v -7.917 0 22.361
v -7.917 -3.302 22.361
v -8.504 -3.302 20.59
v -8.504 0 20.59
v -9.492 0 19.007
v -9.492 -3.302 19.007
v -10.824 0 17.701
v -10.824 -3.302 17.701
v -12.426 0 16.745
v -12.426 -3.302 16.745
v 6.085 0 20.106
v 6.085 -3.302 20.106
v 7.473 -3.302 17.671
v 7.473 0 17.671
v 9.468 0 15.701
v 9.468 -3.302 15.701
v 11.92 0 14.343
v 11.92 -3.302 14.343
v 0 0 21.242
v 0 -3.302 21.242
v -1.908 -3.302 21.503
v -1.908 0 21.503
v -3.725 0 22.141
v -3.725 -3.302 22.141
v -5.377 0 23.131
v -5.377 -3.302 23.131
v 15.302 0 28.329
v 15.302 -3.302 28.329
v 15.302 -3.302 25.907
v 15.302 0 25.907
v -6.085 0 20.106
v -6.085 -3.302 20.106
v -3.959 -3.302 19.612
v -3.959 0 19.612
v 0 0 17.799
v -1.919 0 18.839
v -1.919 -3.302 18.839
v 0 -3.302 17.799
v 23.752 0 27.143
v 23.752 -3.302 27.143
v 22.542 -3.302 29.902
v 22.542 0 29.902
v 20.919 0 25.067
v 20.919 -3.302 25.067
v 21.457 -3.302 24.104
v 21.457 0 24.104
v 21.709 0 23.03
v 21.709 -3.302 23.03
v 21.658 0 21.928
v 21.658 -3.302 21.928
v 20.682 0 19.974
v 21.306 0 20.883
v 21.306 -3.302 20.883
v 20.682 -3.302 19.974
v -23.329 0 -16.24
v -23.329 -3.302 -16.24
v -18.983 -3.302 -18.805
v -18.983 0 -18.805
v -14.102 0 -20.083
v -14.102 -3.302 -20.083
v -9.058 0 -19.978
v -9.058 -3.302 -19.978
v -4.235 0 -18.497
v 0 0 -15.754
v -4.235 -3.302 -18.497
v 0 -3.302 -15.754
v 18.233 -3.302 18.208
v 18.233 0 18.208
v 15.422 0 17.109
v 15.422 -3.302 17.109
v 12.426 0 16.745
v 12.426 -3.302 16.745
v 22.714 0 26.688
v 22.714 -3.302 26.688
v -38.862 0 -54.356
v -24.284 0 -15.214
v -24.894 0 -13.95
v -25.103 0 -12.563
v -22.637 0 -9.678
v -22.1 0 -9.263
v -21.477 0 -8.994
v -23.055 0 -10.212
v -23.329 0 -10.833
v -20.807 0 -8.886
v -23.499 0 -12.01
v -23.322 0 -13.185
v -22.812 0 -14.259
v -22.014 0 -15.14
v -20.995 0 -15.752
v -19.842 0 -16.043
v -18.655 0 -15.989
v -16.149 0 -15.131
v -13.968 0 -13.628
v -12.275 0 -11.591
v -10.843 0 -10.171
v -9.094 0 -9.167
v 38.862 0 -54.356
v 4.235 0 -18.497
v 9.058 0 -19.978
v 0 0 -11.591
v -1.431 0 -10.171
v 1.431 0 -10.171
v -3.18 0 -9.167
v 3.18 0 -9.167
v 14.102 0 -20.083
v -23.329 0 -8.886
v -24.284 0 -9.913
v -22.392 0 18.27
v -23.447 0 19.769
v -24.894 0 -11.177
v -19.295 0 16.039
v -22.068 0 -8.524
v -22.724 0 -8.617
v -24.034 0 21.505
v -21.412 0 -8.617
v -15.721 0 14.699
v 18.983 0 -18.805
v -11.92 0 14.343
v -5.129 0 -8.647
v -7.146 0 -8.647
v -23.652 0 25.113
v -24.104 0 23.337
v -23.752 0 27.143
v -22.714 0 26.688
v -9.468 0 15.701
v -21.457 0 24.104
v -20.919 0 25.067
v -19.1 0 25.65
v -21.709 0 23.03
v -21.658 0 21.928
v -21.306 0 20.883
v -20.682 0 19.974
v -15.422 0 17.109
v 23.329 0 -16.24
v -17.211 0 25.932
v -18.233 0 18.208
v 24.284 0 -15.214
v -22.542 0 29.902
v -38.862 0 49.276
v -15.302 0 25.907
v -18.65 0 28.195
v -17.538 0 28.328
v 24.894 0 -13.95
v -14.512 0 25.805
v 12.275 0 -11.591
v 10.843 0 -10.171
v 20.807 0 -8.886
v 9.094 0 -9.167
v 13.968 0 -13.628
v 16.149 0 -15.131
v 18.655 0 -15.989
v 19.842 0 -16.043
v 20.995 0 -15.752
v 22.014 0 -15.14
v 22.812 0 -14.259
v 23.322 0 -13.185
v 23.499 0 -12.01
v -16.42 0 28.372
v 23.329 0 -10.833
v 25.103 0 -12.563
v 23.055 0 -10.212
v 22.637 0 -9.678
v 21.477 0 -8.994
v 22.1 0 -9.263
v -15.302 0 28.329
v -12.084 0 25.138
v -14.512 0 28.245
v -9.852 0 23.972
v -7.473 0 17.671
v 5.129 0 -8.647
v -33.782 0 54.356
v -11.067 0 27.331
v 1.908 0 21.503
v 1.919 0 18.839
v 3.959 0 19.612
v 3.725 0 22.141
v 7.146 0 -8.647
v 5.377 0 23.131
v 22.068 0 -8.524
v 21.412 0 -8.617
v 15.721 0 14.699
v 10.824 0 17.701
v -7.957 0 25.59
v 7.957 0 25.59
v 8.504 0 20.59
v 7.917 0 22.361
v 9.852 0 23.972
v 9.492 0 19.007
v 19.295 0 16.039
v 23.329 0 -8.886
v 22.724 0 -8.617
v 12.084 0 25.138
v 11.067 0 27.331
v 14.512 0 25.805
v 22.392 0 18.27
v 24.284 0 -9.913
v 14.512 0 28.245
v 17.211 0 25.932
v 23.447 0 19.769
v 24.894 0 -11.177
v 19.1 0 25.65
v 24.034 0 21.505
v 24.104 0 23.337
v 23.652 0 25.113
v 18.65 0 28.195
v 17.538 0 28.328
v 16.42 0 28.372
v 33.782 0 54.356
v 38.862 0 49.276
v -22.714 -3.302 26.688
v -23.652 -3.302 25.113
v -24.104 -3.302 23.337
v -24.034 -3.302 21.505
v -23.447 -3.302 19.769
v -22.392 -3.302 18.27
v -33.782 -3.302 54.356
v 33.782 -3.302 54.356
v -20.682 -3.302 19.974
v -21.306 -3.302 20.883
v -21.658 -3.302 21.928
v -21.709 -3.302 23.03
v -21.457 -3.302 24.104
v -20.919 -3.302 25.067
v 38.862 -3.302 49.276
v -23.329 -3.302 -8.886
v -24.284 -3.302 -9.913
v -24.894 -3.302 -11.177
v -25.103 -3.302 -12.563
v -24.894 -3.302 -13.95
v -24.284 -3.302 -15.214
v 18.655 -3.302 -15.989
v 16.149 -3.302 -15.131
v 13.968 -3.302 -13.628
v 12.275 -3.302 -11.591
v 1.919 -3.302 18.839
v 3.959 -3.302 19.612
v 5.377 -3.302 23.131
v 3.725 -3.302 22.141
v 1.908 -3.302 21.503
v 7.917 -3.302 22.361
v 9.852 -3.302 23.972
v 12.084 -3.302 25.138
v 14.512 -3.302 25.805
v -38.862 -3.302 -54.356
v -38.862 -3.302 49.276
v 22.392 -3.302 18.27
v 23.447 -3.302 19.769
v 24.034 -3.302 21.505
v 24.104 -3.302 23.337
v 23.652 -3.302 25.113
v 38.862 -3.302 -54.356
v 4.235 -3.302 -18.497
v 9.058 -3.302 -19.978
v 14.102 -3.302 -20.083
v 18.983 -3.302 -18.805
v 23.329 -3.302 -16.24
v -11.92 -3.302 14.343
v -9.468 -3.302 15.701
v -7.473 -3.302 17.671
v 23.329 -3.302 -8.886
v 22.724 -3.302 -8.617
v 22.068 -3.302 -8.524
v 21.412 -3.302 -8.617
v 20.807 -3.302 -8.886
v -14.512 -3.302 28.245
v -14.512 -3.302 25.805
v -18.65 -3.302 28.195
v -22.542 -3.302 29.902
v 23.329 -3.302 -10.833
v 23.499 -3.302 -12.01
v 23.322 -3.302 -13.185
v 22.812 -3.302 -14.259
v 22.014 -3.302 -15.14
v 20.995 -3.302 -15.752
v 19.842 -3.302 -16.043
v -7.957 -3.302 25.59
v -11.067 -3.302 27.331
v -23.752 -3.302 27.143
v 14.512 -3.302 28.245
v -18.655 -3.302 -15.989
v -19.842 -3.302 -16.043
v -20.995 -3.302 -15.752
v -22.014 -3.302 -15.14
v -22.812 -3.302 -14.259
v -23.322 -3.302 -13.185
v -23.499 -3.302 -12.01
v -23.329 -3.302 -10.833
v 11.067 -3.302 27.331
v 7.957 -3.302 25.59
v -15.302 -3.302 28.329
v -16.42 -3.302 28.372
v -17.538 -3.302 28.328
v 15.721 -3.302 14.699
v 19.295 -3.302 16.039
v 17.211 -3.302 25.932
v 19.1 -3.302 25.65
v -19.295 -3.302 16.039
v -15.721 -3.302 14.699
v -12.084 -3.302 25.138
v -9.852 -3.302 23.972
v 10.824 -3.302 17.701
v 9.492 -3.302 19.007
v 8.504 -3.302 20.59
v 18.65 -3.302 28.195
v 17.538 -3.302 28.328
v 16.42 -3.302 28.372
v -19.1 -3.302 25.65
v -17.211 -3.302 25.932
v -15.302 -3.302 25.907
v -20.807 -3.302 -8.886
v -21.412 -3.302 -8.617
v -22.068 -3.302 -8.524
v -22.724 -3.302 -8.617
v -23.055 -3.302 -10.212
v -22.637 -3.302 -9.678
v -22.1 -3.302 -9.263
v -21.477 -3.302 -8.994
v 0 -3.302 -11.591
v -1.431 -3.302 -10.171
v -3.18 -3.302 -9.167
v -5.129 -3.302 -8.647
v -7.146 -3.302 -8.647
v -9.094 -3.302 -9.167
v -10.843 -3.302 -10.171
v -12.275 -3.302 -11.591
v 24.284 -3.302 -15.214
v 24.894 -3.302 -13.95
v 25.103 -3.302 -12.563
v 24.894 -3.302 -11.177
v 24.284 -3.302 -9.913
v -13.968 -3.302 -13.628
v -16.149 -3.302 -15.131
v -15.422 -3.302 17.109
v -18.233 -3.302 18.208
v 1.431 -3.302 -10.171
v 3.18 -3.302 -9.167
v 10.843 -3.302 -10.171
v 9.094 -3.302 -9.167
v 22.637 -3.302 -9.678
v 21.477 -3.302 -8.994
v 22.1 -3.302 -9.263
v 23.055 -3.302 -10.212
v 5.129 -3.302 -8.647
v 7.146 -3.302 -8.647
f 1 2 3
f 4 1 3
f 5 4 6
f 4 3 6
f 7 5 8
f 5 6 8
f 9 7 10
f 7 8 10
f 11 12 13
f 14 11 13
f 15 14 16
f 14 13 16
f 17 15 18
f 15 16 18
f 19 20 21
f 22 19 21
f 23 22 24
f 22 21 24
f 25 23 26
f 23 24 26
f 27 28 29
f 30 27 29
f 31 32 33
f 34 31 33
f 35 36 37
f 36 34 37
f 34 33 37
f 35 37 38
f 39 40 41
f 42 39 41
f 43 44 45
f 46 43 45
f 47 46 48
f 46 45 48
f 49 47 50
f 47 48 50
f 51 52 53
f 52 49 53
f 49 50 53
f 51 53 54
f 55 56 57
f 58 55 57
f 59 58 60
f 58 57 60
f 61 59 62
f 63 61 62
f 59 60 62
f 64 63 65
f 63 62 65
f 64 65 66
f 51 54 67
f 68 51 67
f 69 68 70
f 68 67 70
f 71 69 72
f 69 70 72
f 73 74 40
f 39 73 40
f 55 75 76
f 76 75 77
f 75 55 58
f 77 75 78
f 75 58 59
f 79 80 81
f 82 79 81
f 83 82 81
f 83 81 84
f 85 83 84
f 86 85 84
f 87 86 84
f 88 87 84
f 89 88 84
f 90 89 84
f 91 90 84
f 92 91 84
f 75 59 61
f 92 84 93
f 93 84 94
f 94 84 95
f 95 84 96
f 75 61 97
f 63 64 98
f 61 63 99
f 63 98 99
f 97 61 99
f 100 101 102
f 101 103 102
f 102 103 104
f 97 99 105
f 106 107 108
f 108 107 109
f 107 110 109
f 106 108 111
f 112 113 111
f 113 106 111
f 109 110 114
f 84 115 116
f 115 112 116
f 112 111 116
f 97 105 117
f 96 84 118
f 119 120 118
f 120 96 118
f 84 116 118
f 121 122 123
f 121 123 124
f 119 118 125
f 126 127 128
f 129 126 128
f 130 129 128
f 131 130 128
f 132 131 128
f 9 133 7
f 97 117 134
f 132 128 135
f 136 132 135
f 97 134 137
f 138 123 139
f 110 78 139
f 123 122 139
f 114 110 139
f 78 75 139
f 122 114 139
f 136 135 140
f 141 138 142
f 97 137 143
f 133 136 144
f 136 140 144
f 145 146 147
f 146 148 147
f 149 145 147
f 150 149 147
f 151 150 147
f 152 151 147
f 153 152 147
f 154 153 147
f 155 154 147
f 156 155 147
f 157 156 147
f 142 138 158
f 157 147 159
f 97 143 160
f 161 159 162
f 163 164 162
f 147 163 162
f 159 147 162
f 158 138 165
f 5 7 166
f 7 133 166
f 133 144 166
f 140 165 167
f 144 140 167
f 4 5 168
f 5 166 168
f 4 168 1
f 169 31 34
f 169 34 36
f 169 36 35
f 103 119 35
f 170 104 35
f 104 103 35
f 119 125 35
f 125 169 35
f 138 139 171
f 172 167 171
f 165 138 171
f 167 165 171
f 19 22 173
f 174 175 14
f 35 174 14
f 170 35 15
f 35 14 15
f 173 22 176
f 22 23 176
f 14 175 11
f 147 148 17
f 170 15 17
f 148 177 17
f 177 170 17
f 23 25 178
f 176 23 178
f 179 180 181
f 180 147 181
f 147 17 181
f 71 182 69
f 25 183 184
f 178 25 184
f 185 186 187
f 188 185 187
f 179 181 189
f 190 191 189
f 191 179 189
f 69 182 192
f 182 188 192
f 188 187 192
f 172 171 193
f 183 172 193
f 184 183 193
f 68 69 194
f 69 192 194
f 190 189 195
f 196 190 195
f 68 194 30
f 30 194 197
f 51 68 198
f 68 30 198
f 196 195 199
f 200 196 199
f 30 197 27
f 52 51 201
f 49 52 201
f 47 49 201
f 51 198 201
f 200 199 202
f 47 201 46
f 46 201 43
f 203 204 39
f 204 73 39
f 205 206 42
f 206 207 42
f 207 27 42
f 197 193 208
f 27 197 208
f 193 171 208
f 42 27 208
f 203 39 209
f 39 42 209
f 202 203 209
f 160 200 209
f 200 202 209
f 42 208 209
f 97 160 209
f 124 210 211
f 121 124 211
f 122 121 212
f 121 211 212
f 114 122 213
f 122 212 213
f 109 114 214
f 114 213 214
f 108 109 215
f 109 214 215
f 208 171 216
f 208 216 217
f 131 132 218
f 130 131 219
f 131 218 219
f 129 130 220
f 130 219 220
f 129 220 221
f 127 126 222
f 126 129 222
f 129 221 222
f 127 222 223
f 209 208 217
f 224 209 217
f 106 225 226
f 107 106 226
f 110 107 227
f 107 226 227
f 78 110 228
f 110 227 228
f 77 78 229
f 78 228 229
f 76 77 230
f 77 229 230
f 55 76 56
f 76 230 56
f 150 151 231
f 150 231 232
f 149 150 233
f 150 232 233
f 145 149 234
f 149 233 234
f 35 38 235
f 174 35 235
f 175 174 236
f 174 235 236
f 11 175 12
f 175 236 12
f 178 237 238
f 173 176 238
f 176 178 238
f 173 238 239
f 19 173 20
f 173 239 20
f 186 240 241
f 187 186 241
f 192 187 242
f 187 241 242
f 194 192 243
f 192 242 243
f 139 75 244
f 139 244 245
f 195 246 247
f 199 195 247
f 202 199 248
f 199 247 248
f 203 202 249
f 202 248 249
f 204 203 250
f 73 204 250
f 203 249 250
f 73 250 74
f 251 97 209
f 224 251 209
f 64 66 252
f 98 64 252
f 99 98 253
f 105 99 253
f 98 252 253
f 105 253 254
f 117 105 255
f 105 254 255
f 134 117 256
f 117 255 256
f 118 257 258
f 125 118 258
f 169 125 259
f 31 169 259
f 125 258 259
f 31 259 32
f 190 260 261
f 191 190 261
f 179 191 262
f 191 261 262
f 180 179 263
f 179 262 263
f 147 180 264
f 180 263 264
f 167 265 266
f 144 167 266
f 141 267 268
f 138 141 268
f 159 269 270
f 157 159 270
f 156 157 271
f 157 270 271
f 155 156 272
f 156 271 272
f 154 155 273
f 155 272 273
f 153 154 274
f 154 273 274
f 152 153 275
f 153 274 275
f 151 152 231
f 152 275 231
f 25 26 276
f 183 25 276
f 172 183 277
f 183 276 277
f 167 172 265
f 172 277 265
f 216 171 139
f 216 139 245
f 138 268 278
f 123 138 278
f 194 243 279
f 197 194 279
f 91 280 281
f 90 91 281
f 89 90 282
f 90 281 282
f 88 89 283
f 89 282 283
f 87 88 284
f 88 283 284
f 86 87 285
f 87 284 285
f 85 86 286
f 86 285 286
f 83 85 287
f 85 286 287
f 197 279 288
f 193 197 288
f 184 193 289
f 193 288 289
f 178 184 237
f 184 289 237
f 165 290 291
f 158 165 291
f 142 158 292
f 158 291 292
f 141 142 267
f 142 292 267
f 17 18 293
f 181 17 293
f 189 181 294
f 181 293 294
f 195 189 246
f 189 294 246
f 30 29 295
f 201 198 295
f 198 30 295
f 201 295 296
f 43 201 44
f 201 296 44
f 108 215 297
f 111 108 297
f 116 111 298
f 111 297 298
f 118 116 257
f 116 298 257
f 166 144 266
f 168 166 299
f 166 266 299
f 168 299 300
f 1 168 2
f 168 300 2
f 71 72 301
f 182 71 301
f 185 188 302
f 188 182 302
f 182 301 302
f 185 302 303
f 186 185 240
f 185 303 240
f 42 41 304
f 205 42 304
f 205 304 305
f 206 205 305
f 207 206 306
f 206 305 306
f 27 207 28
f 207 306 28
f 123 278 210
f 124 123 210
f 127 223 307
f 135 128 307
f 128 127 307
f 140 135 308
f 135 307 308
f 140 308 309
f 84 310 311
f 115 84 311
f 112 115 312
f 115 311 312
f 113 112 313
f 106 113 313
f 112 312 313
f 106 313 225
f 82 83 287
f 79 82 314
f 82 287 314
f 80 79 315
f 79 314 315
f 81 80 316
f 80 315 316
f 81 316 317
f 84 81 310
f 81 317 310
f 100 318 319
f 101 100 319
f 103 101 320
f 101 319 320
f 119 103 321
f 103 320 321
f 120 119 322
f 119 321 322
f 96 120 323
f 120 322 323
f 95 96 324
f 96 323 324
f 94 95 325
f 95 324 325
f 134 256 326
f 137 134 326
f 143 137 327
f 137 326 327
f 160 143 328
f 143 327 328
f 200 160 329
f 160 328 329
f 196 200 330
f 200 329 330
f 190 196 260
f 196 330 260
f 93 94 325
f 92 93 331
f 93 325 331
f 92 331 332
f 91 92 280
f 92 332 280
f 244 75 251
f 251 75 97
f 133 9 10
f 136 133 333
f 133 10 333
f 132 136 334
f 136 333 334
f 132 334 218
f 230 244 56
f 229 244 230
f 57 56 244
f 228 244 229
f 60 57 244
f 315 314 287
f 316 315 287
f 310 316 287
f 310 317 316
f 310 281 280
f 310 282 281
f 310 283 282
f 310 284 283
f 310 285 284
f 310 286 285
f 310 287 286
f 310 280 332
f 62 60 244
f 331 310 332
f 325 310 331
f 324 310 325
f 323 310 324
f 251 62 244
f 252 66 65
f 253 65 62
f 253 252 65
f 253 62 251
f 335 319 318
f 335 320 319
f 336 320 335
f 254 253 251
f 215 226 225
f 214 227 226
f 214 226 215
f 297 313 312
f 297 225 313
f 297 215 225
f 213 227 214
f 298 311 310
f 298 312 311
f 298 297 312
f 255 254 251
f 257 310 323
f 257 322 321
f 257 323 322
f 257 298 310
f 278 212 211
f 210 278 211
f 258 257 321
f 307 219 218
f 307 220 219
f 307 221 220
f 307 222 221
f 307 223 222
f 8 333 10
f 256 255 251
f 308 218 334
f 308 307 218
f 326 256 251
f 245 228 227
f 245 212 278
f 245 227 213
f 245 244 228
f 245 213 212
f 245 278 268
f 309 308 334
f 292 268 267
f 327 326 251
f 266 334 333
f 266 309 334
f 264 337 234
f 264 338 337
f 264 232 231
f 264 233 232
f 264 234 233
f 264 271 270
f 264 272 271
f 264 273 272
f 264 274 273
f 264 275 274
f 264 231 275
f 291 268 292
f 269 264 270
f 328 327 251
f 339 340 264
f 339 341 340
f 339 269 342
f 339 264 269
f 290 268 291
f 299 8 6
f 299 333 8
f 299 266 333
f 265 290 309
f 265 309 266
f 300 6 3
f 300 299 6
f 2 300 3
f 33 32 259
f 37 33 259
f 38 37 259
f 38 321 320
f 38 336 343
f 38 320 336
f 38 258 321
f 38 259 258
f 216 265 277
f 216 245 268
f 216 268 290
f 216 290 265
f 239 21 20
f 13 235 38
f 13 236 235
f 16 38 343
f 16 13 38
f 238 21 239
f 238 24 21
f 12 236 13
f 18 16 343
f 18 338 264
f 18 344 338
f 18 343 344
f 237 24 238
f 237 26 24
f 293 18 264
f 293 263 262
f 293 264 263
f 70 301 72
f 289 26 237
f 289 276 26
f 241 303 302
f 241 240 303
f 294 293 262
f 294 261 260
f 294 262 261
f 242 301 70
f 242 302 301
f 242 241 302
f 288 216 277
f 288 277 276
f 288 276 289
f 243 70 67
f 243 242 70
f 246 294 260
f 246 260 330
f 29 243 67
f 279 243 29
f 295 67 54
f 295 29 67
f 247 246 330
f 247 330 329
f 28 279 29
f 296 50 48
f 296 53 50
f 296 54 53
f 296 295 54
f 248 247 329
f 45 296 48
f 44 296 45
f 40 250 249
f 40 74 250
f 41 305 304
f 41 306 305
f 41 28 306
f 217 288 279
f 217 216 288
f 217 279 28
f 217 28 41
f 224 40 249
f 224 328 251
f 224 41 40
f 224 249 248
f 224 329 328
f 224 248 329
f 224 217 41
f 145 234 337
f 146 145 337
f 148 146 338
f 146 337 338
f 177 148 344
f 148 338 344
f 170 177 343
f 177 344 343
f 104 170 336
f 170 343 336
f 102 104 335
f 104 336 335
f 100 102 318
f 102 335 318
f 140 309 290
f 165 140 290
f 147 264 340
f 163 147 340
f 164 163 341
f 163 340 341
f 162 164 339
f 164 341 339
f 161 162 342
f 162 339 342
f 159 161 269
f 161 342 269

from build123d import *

# Parameters (mm, degrees)
F0_W     = 77.724
F0_H     = 108.712
F1_DEPTH = 3.302
F3_R     = 13.3445871966
F4_DEPTH = 3.302
F5_SIZE  = 5.08
F7_DEPTH = 3.303


with BuildPart() as f1:
    # F0 (on Front) → F1 (new body)
    with BuildSketch(Plane.XZ):
        Rectangle(F0_W, F0_H)
    extrude(amount=F1_DEPTH)

    # F3 (on face) → F4 (join)
    with BuildSketch(Plane.XZ.offset(3.302)):
        with BuildLine():
            add(Edge.make_bspline(
                [(-33.1284857231, -24.3833554431), (-30.3980902484, -23.448268281), (-27.6625298974, -23.0135580616), (-24.9168122419, -22.8877504962)],
                knots=[0.0236239796, 0.0236239796, 0.0236239796, 0.0236239796, 0.1438563975, 0.1438563975, 0.1438563975, 0.1438563975], degree=3))
            ThreePointArc((-33.1284857231, -24.3833554431), (-29.1410849834, -38.4326879001), (-15.8749999992, -44.5395771521))
            ThreePointArc((-15.8749999992, -44.5395771521), (-7.7803065213, -45.3411097626), (9e-10, -47.7145771515))
            ThreePointArc((9e-10, -47.7145771515), (7.780306523, -45.3411097624), (15.8750000008, -44.5395771515))
            ThreePointArc((15.8750000008, -44.5395771515), (28.9710149024, -38.6284104056), (33.2008619827, -24.8968448621))
            add(Edge.make_bspline(
                [(22.7832318895, -28.264905571), (26.870414184, -28.3483991479), (30.7081117423, -27.7740633769), (33.2008619827, -24.8968448621)],
                knots=[0.8224951004, 0.8224951004, 0.8224951004, 0.8224951004, 0.9908039431, 0.9908039431, 0.9908039431, 0.9908039431], degree=3))
            add(Edge.make_bspline(
                [(15.9953683619, -27.7933645546), (16.7598950609, -27.862629463), (19.0104314318, -28.0581684328), (21.3052242348, -28.2347126075), (22.7832318895, -28.264905571)],
                knots=[0.7300371536, 0.7300371536, 0.7300371536, 0.7300371536, 0.7616312241, 0.8224951004, 0.8224951004, 0.8224951004, 0.8224951004], degree=3))
            add(Edge.make_bspline(
                [(12.0445173218, -27.4086319137), (13.3501324037, -27.5450763369), (14.6659309282, -27.6729196282), (15.9953683619, -27.7933645546)],
                knots=[0.6750981435, 0.6750981435, 0.6750981435, 0.6750981435, 0.7300371536, 0.7300371536, 0.7300371536, 0.7300371536], degree=3))
            add(Edge.make_bspline(
                [(6.5035843618, -26.7679947406), (8.3365045469, -27.0014140297), (10.1801283043, -27.2137923413), (12.0445173218, -27.4086319137)],
                knots=[0.5966464709, 0.5966464709, 0.5966464709, 0.5966464709, 0.6750981435, 0.6750981435, 0.6750981435, 0.6750981435], degree=3))
            add(Edge.make_bspline(
                [(-15.7821923495, -23.3437299796), (-10.5480047667, -23.9624284424), (-3.1004870846, -25.4363431139), (4.3262408996, -26.490713729), (6.5035843618, -26.7679947406)],
                knots=[0.2765511336, 0.2765511336, 0.2765511336, 0.2765511336, 0.5034529768, 0.5966464709, 0.5966464709, 0.5966464709, 0.5966464709], degree=3))
            add(Edge.make_bspline(
                [(-24.9168122419, -22.8877504962), (-22.5127229742, -22.777596192), (-19.4725911361, -22.9372512735), (-16.4147628171, -23.2689580365), (-15.7821923495, -23.3437299796)],
                knots=[0.1438563975, 0.1438563975, 0.1438563975, 0.1438563975, 0.2491292266, 0.2765511336, 0.2765511336, 0.2765511336, 0.2765511336], degree=3))
        make_face()
        with BuildLine():
            ThreePointArc((-24.3962783332, -9.4429305632), (-23.5493439512, -16.2082072875), (-24.9168122419, -22.8877504962))
            add(Edge.make_bspline(
                [(-24.9168122419, -22.8877504962), (-22.5127229742, -22.777596192), (-19.4725911361, -22.9372512735), (-16.4147628171, -23.2689580365), (-15.7821923495, -23.3437299796)],
                knots=[0.1438563975, 0.1438563975, 0.1438563975, 0.1438563975, 0.2491292266, 0.2765511336, 0.2765511336, 0.2765511336, 0.2765511336], degree=3))
            ThreePointArc((-15.7821923495, -23.3437299796), (-16.7909764629, -16.1431204561), (-15.7821923495, -8.9425109327))
            add(Edge.make_bspline(
                [(-20.8150930703, 3.0249084812), (-20.084698855, 3.2617064252), (-18.5750809579, 3.7511331524), (-20.1108934357, 5.7423249077), (-21.3989497629, 8.4805039988), (-19.5926222129, 8.6232034417), (-20.0960081308, 6.4882204736), (-17.9845367, 4.4717269755), (-19.4827279307, 7.4877563676), (-17.6531933794, 7.9935220173), (-17.6518746238, 3.7165445405), (-19.7201607312, 2.5442912986), (-19.0033211234, 0.5113026434), (-21.5358089244, 0.646088536), (-20.7796208818, -5.7027505195), (-14.9489180074, 0.0978196974), (-17.977030073, 1.5236381763), (-14.9168721562, 2.6666255778), (-16.1211586732, 6.3598723413), (-13.8328776174, 5.6005762962), (-15.1421128769, 3.3154322822), (-14.4747759607, 0.1624480587), (-13.8084140261, 5.1188240441), (-11.0343102947, 2.7331078221), (-14.5615723999, -0.162479085), (-17.3031216925, -3.3366762112), (-18.0975664008, -8.8898410691), (-13.4356882131, -5.5746333853), (-15.3648709473, -3.8082111356), (-12.0527139611, -3.6659211986), (-13.248535603, -1.079337143), (-9.5910344453, -1.7447413323), (-10.7422685487, 3.0079941618), (-8.9849464366, -1.96339633), (-8.8102943074, 5.4988116301), (-7.4861779197, -0.6957485248), (-9.6724060403, -0.966318494), (-11.0218385517, -3.5291741027), (-13.7004320012, -4.2797101397), (-12.8029593717, -6.9381020727), (-14.7089673153, -8.2196946287), (-15.7821923495, -8.9425109327)],
                knots=[0, 0, 0, 0, 0.0231511603, 0.0478500744, 0.0752755755, 0.0903366321, 0.1142638791, 0.1352244444, 0.1593040946, 0.1744947233, 0.2060790631, 0.2315955315, 0.2516703156, 0.2733460952, 0.3049833457, 0.3431527772, 0.3650886659, 0.3896180862, 0.4183185893, 0.4354180503, 0.4626318971, 0.4841465121, 0.512674348, 0.5346264378, 0.5675595767, 0.6056671213, 0.6368592747, 0.6681518224, 0.6879987795, 0.7121233264, 0.7334743783, 0.7591560932, 0.7848708559, 0.8073025156, 0.8374341523, 0.8673194844, 0.8904493251, 0.9187369989, 0.9444600919, 0.9686867066, 1, 1, 1, 1], degree=3))
            add(Edge.make_bspline(
                [(-25.8914344013, -2.4853385985), (-26.396572956, -2.0003344615), (-27.3138435109, -1.1196261405), (-29.1352849859, -2.0598979002), (-28.7106271057, 0.8204026064), (-32.0312644098, -1.1715068103), (-31.3002695814, 3.7485837155), (-29.4483178555, 3.8301118075), (-30.8071023081, 1.5653871303), (-28.9526334159, 1.3619840648), (-29.4792210737, 5.2085047756), (-26.921055424, 4.4342075194), (-28.8119762327, 2.2854028303), (-27.5906596289, -1.3990701213), (-27.7699356497, 3.0747016102), (-25.2099586785, 2.6066763518), (-26.5953437573, -0.395391095), (-23.7025988652, -2.0340069969), (-23.1772681034, -6.0499515041), (-20.5435134821, -4.1808959475), (-25.0748704565, 2.6489737746), (-20.1368344266, 0.7949418705), (-20.6048167244, 2.3336418411), (-20.8150930703, 3.0249084812)],
                knots=[0, 0, 0, 0, 0.0457250435, 0.0830311605, 0.1245988121, 0.1705511092, 0.2321726775, 0.2625557415, 0.30723362, 0.3358214151, 0.393012377, 0.4286583434, 0.4808472993, 0.5282384525, 0.5813000538, 0.6192860311, 0.6705302416, 0.7286736986, 0.7872738172, 0.8280557864, 0.9074882994, 0.958434574, 1, 1, 1, 1], degree=3))
            ThreePointArc((-25.8914344013, -2.4853385985), (-24.9290967698, -4.9824855111), (-24.3962783332, -7.6050683856))
            add(Edge.make_bspline(
                [(-24.3962783332, -9.4429305632), (-25.4357243907, -10.1342055857), (-27.412273175, -11.4486922391), (-27.4547789496, -7.4214675852), (-30.5466070306, -9.5733915774), (-30.4542370334, -5.4520792207), (-32.3177618611, -5.8417990903), (-32.7140680164, -4.2769830225), (-32.0543630337, -2.7007935171), (-32.1251676799, -4.5533058245), (-30.3843482976, -5.4648837492), (-32.0501040037, -1.6640768267), (-30.4436660674, -1.9005229869), (-30.1720801803, -6.5942041642), (-29.7456686663, -3.178537531), (-28.1334595609, -3.5814958653), (-29.8697325683, -5.6494579394), (-29.5018476184, -7.7306733995), (-27.2359049314, -6.3250302911), (-26.4788550338, -9.3239236743), (-25.0993332141, -8.1853413666), (-24.3962783332, -7.6050683856)],
                knots=[0, 0, 0, 0, 0.0670169121, 0.1274354192, 0.1840138636, 0.2505621343, 0.2960523516, 0.3441354147, 0.3840734056, 0.4287810373, 0.4665753725, 0.5348972739, 0.5667760176, 0.6369485958, 0.6883070256, 0.7231632661, 0.7842390879, 0.8324575559, 0.8851485442, 0.9414679355, 1, 1, 1, 1], degree=3))
        make_face()
        with BuildLine():
            add(Edge.make_bspline(
                [(-20.2924981713, -15.781018883), (-20.5370775999, -16.1379246214), (-20.134132622, -17.1534868603), (-20.8639151565, -18.5661521393), (-21.9358468203, -19.4575377926), (-22.3700864307, -21.8865095148), (-20.237349518, -21.5763362209), (-19.5672362136, -20.438180371), (-19.2965010699, -18.8033454883), (-19.7803037906, -17.8720601229), (-19.908738804, -16.4540465799), (-19.0188083322, -15.0649598827), (-20.0853771822, -15.4787748635), (-20.2924981713, -15.781018883)],
                knots=[0, 0, 0, 0, 0.0904118203, 0.1854248684, 0.2814922978, 0.3865094541, 0.4809925493, 0.5711470892, 0.6690619631, 0.748512495, 0.8439845899, 0.9234351565, 1, 1, 1, 1], degree=3))
        make_face(mode=Mode.SUBTRACT)
        with BuildLine():
            add(Edge.make_bspline(
                [(-22.3910957575, -11.5529615432), (-22.0568118654, -12.2037220004), (-21.1170784891, -12.8832887919), (-21.7129777335, -14.1967346716), (-20.5379115522, -14.568750962), (-20.4867607869, -13.5076873001), (-20.8432701563, -11.8831681267), (-21.6439811905, -11.2404808042), (-22.9718655512, -9.3501247732), (-22.6978835435, -10.9557285785), (-22.3910957575, -11.5529615432)],
                knots=[0, 0, 0, 0, 0.1505340204, 0.2658311351, 0.3614801071, 0.4617187858, 0.6051372816, 0.7298931385, 0.8618479683, 1, 1, 1, 1], degree=3))
        make_face(mode=Mode.SUBTRACT)
        with BuildLine():
            add(Edge.make_bspline(
                [(-18.3790698647, -10.1024601609), (-18.7969421772, -10.2564427963), (-19.1553590595, -11.577398565), (-19.219348267, -12.6506630096), (-19.2408550579, -13.9350019391), (-18.8743899715, -14.8858473731), (-18.2833235222, -14.0155234153), (-18.1315989973, -13.0706647968), (-18.7065283271, -12.3462231403), (-18.4694817034, -11.2210464666), (-17.1590443019, -10.374237249), (-18.0760721444, -9.9908079022), (-18.3790698647, -10.1024601609)],
                knots=[0, 0, 0, 0, 0.1240572212, 0.2333232805, 0.347818092, 0.428679644, 0.5131510602, 0.6107152668, 0.7012679009, 0.8047604962, 0.9100465523, 1, 1, 1, 1], degree=3))
        make_face(mode=Mode.SUBTRACT)
        with BuildLine():
            ThreePointArc((5.4403450859, -12.5461180708), (6.6092683485, -19.609411059), (6.5035843618, -26.7679947406))
            add(Edge.make_bspline(
                [(6.5035843618, -26.7679947406), (8.3365045469, -27.0014140297), (10.1801283043, -27.2137923413), (12.0445173218, -27.4086319137)],
                knots=[0.5966464709, 0.5966464709, 0.5966464709, 0.5966464709, 0.6750981435, 0.6750981435, 0.6750981435, 0.6750981435], degree=3))
            Line((12.0445173218, -27.4086319137), (12.0445173218, -21.4756764472))
            ThreePointArc((12.0445173218, -21.4756764472), (14.0199428419, -19.5002509271), (15.9953683619, -21.4756764472))
            Line((15.9953683619, -21.4756764472), (15.9953683619, -27.7933645546))
            add(Edge.make_bspline(
                [(15.9953683619, -27.7933645546), (16.7598950609, -27.862629463), (19.0104314318, -28.0581684328), (21.3052242348, -28.2347126075), (22.7832318895, -28.264905571)],
                knots=[0.7300371536, 0.7300371536, 0.7300371536, 0.7300371536, 0.7616312241, 0.8224951004, 0.8224951004, 0.8224951004, 0.8224951004], degree=3))
            ThreePointArc((22.7832318895, -28.264905571), (22.4736636829, -20.3696155623), (23.5801553445, -12.5461180708))
            Line((23.5801553445, -12.5461180708), (28.4554600831, -13.4531514135))
            ThreePointArc((28.4554600831, -13.4531514135), (31.673336573, -11.9989868814), (31.424967593, -8.4765393743))
            ThreePointArc((31.424967593, -8.4765393743), (29.2529740879, -8.2440657168), (29.0205004305, -10.4160592219))
            ThreePointArc((29.0205004305, -10.4160592219), (29.058069024, -11.9208265797), (27.614886003, -12.3485636115))
            ThreePointArc((27.614886003, -12.3485636115), (23.4712314741, -5.8636115848), (28.4554600831, 0))
            ThreePointArc((28.4554600831, 0), (23.3706331923, -0.6006945639), (18.2612345592, -0.9328753515))
            Line((18.2612345592, -0.9328753515), (21.109645709, 8.6648291047))
            Line((21.109645709, 8.6648291047), (22.7452469365, 8.179414619))
            ThreePointArc((22.7452469365, 8.179414619), (24.0675287583, 9.9087492795), (21.9295363303, 9.4988517773))
            ThreePointArc((21.9295363303, 9.4988517773), (17.0915933325, 15.0640837031), (15.5871994793, 22.2831070423))
            Line((15.5871994793, 22.2831070423), (14.8853833456, 29.6840668302))
            Line((14.8853833456, 29.6840668302), (17.9889984262, 30.165095753))
            Line((17.9889984262, 30.165095753), (17.720128815, 31.8998516907))
            Line((17.720128815, 31.8998516907), (14.8043116011, 31.4479295364))
            Line((14.8043116011, 31.4479295364), (14.2361351446, 35.1138234881))
            Line((14.2361351446, 35.1138234881), (12.1174789965, 34.7854532301))
            Line((12.1174789965, 34.7854532301), (12.6562453806, 31.3093140721))
            Line((12.6562453806, 31.3093140721), (10.0379107516, 30.7162171018))
            Line((10.0379107516, 30.7162171018), (10.2517836951, 29.4975203391))
            Line((10.2517836951, 29.4975203391), (12.7509497106, 29.9361068755))
            Line((12.7509497106, 29.9361068755), (14.0939988196, 22.2831070423))
            ThreePointArc((14.0939988196, 22.2831070423), (12.6245914015, 15.2177663733), (7.6988285058, 9.9437681912))
            ThreePointArc((7.6988285058, 9.9437681912), (5.5906171254, 10.4864212664), (6.8022884056, 8.6778637491))
            Line((6.8022884056, 8.6778637491), (8.4650181234, 9.060157463))
            Line((8.4650181234, 9.060157463), (10.762639533, -0.9330055424))
            ThreePointArc((10.762639533, -0.9330055424), (5.6515483018, -0.6008483836), (0.5650403473, 0))
            ThreePointArc((0.5650403473, 0), (5.5492689564, -5.8636115848), (1.4056144274, -12.3485636115))
            ThreePointArc((1.4056144274, -12.3485636115), (-0.0375685935, -11.9208265797), (0, -10.4160592219))
            ThreePointArc((0, -10.4160592219), (-0.2324736575, -8.2440657168), (-2.4044671625, -8.4765393743))
            ThreePointArc((-2.4044671625, -8.4765393743), (-2.6528361426, -11.9989868814), (0.5650403473, -13.4531514135))
            Line((0.5650403473, -13.4531514135), (5.4403450859, -12.5461180708))
        make_face()
        Polygon((9.1227404773, -7.4148867279), (8.4774624556, -4.9826856703), (9.749203307, -4.868891682), (10.3401336819, -7.1323132142), align=None, mode=Mode.SUBTRACT)
        Polygon((10.9397291529, -9.5362256838), (9.768018499, -9.8470877856), (9.2899553012, -8.0451578014), (10.461665955, -7.7342956997), align=None, mode=Mode.SUBTRACT)
        Polygon((12.2584053658, -7.3401992658), (12.7159978886, -9.0649705743), (11.5734964264, -9.3680832964), (11.1159039036, -7.6433119879), align=None, mode=Mode.SUBTRACT)
        Polygon((10.332212454, -4.8167246576), (11.5597705233, -4.7068840966), (12.1378842059, -6.8859273354), (10.9000811353, -7.0559568703), align=None, mode=Mode.SUBTRACT)
        Polygon((17.9045965268, -7.6433119879), (17.4470040041, -9.3680832964), (16.3045025419, -9.0649705743), (16.7620950646, -7.3401992658), align=None, mode=Mode.SUBTRACT)
        Polygon((18.5588344754, -7.7342956997), (19.7305451293, -8.0451578014), (19.2524819314, -9.8470877856), (18.0807712776, -9.5362256838), align=None, mode=Mode.SUBTRACT)
        Polygon((18.6803667486, -7.1323132142), (19.2712971234, -4.868891682), (20.5430379748, -4.9826856703), (19.8977599531, -7.4148867279), align=None, mode=Mode.SUBTRACT)
        Polygon((16.8826162245, -6.8859273354), (17.4607299071, -4.7068840966), (18.6882879764, -4.8167246576), (18.1204192951, -7.0559568703), align=None, mode=Mode.SUBTRACT)
        with BuildLine():
            ThreePointArc((14.2767767446, 4.6611620079), (12.1414040207, 5.7303494735), (11.1097303552, 7.8840968947))
            Line((11.1097303552, 7.8840968947), (14.2767767446, 7.8840968947))
            Line((14.2767767446, 7.8840968947), (14.2767767446, 4.6611620079))
        make_face(mode=Mode.SUBTRACT)
        with BuildLine():
            ThreePointArc((11.1459939594, 8.983289175), (12.2280091457, 10.9819830574), (14.2767767446, 11.9658963789))
            Line((14.2767767446, 11.9658963789), (14.2767767446, 8.983289175))
            Line((14.2767767446, 8.983289175), (11.1459939594, 8.983289175))
        make_face(mode=Mode.SUBTRACT)
        with BuildLine():
            ThreePointArc((18.430607267, 7.8840968947), (17.3673699452, 5.6986165643), (15.1747141111, 4.6502567644))
            Line((15.1747141111, 4.6502567644), (15.1747141111, 7.8840968947))
            Line((15.1747141111, 7.8840968947), (18.430607267, 7.8840968947))
        make_face(mode=Mode.SUBTRACT)
        with BuildLine():
            ThreePointArc((15.1747141111, 11.9768016224), (17.2797356479, 11.0126579566), (18.3943436628, 8.983289175))
            Line((18.3943436628, 8.983289175), (15.1747141111, 8.983289175))
            Line((15.1747141111, 8.983289175), (15.1747141111, 11.9768016224))
        make_face(mode=Mode.SUBTRACT)
        with BuildLine():
            ThreePointArc((1.5084841621, 28.7364097307), (5.1963193944, 39.8156504287), (15.8749999992, 44.5395771521))
            ThreePointArc((15.8749999992, 44.5395771521), (7.7803065213, 45.3411097626), (-9e-10, 47.7145771515))
            ThreePointArc((-9e-10, 47.7145771515), (-7.780306523, 45.3411097624), (-15.8750000008, 44.5395771515))
            ThreePointArc((-15.8750000008, 44.5395771515), (-30.2008361805, 37.0625327748), (-32.2586794783, 21.0343995142))
            ThreePointArc((-32.2586794783, 21.0343995142), (-31.4618060576, 11.8664205536), (-35.4362714152, 3.5663922047))
            ThreePointArc((-35.4362714152, 3.5663922047), (-26.8661908779, 8.4248419398), (-17.0921185192, 9.6570447531))
            ThreePointArc((-17.0921185192, 9.6570447531), (-3.3712650978, 14.8871009528), (1.5084841621, 28.7364097307))
        make_face()
        with Locations((-15.8750000008, 27.0770771515)):
            Circle(F3_R, mode=Mode.SUBTRACT)
    extrude(amount=-F4_DEPTH)

    # F5
    f5_edges = [f1.edges().sort_by_distance(p)[0] for p in [
        (-38.862, -1.651, 54.356),
        (38.862, -1.651, 54.356),
    ]]
    chamfer(f5_edges, length=F5_SIZE)

    # F6 (on face) → F7 (cut, through all)
    with BuildSketch(Plane.XZ.offset(3.302)):
        with BuildLine():
            ThreePointArc((0, 17.7992470562), (2.9259799263, 19.2595239635), (6.0847232479, 20.1057554935))
            ThreePointArc((6.0847232479, 20.1057554935), (8.4030825431, 16.6174369282), (11.9199320906, 14.3425906709))
            ThreePointArc((11.9199320906, 14.3425906709), (17.5521496286, 15.250052866), (22.3922886691, 18.2697243878))
            ThreePointArc((22.3922886691, 18.2697243878), (24.1346582563, 22.4183310209), (22.7144827852, 26.6879785948))
            Line((22.7144827852, 26.6879785948), (23.7515561066, 27.1427421039))
            Line((23.7515561066, 27.1427421039), (22.5416645408, 29.9018602818))
            Line((22.5416645408, 29.9018602818), (18.6499707574, 28.1953268238))
            ThreePointArc((18.6499707574, 28.1953268238), (16.9796908007, 28.3607790229), (15.3015451495, 28.3285806123))
            Line((15.3015451495, 28.3285806123), (15.3015451496, 25.9066787166))
            ThreePointArc((15.3015451496, 25.9066787166), (18.1614877216, 25.8291602538), (20.919172577, 25.0672843677))
            ThreePointArc((20.919172577, 25.0672843677), (21.7220157161, 22.4774470847), (20.6816980121, 19.9735394719))
            ThreePointArc((20.6816980121, 19.9735394719), (16.8626294088, 17.5698361275), (12.4261798066, 16.7446151326))
            ThreePointArc((12.4261798066, 16.7446151326), (9.4918847749, 19.0068204373), (7.9172497202, 22.3606517714))
            ThreePointArc((7.9172497202, 22.3606517714), (10.9367663095, 24.6149259554), (14.5120127117, 25.8052392309))
            Line((14.5120127117, 25.8052392309), (14.5120127116, 28.2445575605))
            ThreePointArc((14.5120127116, 28.2445575605), (9.4574501162, 26.5578625175), (5.3765727933, 23.1314965892))
            ThreePointArc((5.3765727933, 23.1314965892), (2.8326457203, 21.7760383678), (0, 21.2422311306))
            ThreePointArc((-8e-10, 21.2422311306), (-2.8326457211, 21.7760383677), (-5.3765727942, 23.131496589))
            ThreePointArc((-5.3765727942, 23.131496589), (-9.4574501172, 26.5578625171), (-14.5120127127, 28.2445575599))
            Line((-14.5120127127, 28.2445575599), (-14.5120127127, 25.8052392304))
            ThreePointArc((-14.5120127127, 25.8052392304), (-10.9367663104, 24.614925955), (-7.917249721, 22.3606517711))
            ThreePointArc((-7.917249721, 22.3606517711), (-9.4918847756, 19.0068204369), (-12.4261798072, 16.7446151322))
            ThreePointArc((-12.4261798072, 16.7446151322), (-16.8626294095, 17.5698361269), (-20.6816980128, 19.9735394711))
            ThreePointArc((-20.6816980128, 19.9735394711), (-21.7220157169, 22.4774470839), (-20.9191725779, 25.0672843669))
            ThreePointArc((-20.9191725779, 25.0672843669), (-18.1614877226, 25.8291602531), (-15.3015451506, 25.906678716))
            Line((-15.3015451506, 25.906678716), (-15.3015451506, 28.3285806117))
            ThreePointArc((-15.3015451506, 28.3285806117), (-16.9796908017, 28.3607790222), (-18.6499707584, 28.1953268231))
            Line((-18.6499707584, 28.1953268231), (-22.5416645419, 29.901860281))
            Line((-22.5416645419, 29.901860281), (-23.7515561076, 27.142742103))
            Line((-23.7515561076, 27.142742103), (-22.7144827862, 26.687978594))
            ThreePointArc((-22.7144827862, 26.687978594), (-24.1346582571, 22.41833102), (-22.3922886698, 18.269724387))
            ThreePointArc((-22.3922886698, 18.269724387), (-17.5521496292, 15.2500528653), (-11.9199320912, 14.3425906704))
            ThreePointArc((-11.9199320912, 14.3425906704), (-8.4030825437, 16.6174369278), (-6.0847232487, 20.1057554932))
            ThreePointArc((-6.0847232487, 20.1057554932), (-2.925979927, 19.2595239634), (-7e-10, 17.7992470562))
        make_face()
        with BuildLine():
            ThreePointArc((-23.3287482958, -16.2404655727), (-11.5765881184, -20.2051496634), (6e-10, -15.7537907362))
            ThreePointArc((0, -15.7537907362), (11.5765881191, -20.205149663), (23.3287482964, -16.2404655719))
            ThreePointArc((23.3287482964, -16.2404655719), (25.1031580449, -12.5634091874), (23.3287482964, -8.886352803))
            ThreePointArc((23.3287482964, -8.886352803), (22.0678979144, -8.5243870247), (20.8070475324, -8.886352803))
            ThreePointArc((20.8070475324, -8.886352803), (22.3811977992, -9.4539678692), (23.3287482964, -10.8332009826))
            ThreePointArc((23.3287482964, -10.8332009826), (22.4455789372, -14.7288707254), (18.6548899937, -15.9885961696))
            ThreePointArc((18.6548899937, -15.9885961696), (15.0067464531, -14.4545125445), (12.274697423, -11.5912500769))
            ThreePointArc((12.274697423, -11.5912500769), (6.1373487115, -8.5816036168), (0, -11.5912500769))
            ThreePointArc((4e-10, -11.5912500769), (-6.1373487112, -8.5816036171), (-12.2746974225, -11.5912500773))
            ThreePointArc((-12.2746974225, -11.5912500773), (-15.0067464526, -14.454512545), (-18.6548899931, -15.9885961703))
            ThreePointArc((-18.6548899931, -15.9885961703), (-22.4455789367, -14.7288707262), (-23.328748296, -10.8332009835))
            ThreePointArc((-23.328748296, -10.8332009835), (-22.3811977988, -9.4539678701), (-20.8070475321, -8.8863528037))
            ThreePointArc((-20.8070475321, -8.8863528037), (-22.0678979141, -8.5243870256), (-23.3287482961, -8.8863528038))
            ThreePointArc((-23.3287482961, -8.8863528038), (-25.1031580444, -12.5634091883), (-23.3287482958, -16.2404655727))
        make_face()
    extrude(amount=-F7_DEPTH, mode=Mode.SUBTRACT)


solid = f1.part
